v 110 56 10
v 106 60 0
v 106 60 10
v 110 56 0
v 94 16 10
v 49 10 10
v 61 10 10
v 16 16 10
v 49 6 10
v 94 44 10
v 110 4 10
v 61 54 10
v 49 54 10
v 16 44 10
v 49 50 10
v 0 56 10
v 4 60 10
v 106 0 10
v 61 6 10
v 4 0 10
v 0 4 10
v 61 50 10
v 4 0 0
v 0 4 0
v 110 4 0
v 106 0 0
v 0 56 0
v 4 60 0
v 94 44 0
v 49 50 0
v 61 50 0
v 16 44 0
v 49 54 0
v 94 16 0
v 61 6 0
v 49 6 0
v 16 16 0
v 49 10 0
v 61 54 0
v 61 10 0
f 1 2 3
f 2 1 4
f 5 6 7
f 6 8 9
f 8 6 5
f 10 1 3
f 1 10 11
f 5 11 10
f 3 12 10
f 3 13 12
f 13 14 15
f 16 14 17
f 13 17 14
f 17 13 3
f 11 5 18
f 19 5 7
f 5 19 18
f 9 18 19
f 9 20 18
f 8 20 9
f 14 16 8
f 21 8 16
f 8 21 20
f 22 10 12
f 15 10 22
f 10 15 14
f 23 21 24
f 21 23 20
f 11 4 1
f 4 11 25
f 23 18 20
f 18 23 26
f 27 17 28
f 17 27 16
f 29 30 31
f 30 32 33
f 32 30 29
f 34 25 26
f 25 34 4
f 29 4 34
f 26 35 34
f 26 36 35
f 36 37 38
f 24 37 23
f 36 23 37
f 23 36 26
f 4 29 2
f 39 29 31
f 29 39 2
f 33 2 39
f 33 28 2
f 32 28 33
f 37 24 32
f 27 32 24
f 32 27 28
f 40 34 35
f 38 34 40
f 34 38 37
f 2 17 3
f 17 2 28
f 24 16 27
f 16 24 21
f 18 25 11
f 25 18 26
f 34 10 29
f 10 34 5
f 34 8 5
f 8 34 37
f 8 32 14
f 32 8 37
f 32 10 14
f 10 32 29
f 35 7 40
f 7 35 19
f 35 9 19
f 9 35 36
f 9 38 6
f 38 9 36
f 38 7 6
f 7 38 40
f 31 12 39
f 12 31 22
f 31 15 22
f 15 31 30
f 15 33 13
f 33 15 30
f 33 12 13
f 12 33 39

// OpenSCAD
$fn = 32;

// ----------------------------------------------------------------------
// Frame plate: 110 x 60 frame, 16 mm rails
// ----------------------------------------------------------------------

// --- parameters (mm) ---
plate_l = 110;            // plate length, X
plate_w = 60;             // plate width, Y
plate_t = 10;             // plate thickness, Z (extrusion height)
corner_c = 4;             // corner chamfer
frame_bar = 16;           // frame rail width
slot_l = 12;              // adjustment slot length
slot_w = 4;               // adjustment slot width

win_l = plate_l - 2 * frame_bar;  // window length
win_w = plate_w - 2 * frame_bar;  // window width

profile = [[4, 0], [106, 0], [110, 4], [110, 56], [106, 60], [4, 60], [0, 56], [0, 4]];  // primary outline, 8 points, counter clockwise
void_1 = [[16, 16], [94, 16], [94, 44], [16, 44]];  // the window, 4 points
void_2 = [[49, 6], [61, 6], [61, 10], [49, 10]];  // adjustment slot, 4 points
void_3 = [[49, 50], [61, 50], [61, 54], [49, 54]];  // adjustment slot, 4 points

// --- the one profile operation ---
difference() {
  linear_extrude(height = plate_t) polygon(points = profile);
  translate([0, 0, -1])
    linear_extrude(height = plate_t + 2) polygon(points = void_1);
  translate([0, 0, -1])
    linear_extrude(height = plate_t + 2) polygon(points = void_2);
  translate([0, 0, -1])
    linear_extrude(height = plate_t + 2) polygon(points = void_3);
}
